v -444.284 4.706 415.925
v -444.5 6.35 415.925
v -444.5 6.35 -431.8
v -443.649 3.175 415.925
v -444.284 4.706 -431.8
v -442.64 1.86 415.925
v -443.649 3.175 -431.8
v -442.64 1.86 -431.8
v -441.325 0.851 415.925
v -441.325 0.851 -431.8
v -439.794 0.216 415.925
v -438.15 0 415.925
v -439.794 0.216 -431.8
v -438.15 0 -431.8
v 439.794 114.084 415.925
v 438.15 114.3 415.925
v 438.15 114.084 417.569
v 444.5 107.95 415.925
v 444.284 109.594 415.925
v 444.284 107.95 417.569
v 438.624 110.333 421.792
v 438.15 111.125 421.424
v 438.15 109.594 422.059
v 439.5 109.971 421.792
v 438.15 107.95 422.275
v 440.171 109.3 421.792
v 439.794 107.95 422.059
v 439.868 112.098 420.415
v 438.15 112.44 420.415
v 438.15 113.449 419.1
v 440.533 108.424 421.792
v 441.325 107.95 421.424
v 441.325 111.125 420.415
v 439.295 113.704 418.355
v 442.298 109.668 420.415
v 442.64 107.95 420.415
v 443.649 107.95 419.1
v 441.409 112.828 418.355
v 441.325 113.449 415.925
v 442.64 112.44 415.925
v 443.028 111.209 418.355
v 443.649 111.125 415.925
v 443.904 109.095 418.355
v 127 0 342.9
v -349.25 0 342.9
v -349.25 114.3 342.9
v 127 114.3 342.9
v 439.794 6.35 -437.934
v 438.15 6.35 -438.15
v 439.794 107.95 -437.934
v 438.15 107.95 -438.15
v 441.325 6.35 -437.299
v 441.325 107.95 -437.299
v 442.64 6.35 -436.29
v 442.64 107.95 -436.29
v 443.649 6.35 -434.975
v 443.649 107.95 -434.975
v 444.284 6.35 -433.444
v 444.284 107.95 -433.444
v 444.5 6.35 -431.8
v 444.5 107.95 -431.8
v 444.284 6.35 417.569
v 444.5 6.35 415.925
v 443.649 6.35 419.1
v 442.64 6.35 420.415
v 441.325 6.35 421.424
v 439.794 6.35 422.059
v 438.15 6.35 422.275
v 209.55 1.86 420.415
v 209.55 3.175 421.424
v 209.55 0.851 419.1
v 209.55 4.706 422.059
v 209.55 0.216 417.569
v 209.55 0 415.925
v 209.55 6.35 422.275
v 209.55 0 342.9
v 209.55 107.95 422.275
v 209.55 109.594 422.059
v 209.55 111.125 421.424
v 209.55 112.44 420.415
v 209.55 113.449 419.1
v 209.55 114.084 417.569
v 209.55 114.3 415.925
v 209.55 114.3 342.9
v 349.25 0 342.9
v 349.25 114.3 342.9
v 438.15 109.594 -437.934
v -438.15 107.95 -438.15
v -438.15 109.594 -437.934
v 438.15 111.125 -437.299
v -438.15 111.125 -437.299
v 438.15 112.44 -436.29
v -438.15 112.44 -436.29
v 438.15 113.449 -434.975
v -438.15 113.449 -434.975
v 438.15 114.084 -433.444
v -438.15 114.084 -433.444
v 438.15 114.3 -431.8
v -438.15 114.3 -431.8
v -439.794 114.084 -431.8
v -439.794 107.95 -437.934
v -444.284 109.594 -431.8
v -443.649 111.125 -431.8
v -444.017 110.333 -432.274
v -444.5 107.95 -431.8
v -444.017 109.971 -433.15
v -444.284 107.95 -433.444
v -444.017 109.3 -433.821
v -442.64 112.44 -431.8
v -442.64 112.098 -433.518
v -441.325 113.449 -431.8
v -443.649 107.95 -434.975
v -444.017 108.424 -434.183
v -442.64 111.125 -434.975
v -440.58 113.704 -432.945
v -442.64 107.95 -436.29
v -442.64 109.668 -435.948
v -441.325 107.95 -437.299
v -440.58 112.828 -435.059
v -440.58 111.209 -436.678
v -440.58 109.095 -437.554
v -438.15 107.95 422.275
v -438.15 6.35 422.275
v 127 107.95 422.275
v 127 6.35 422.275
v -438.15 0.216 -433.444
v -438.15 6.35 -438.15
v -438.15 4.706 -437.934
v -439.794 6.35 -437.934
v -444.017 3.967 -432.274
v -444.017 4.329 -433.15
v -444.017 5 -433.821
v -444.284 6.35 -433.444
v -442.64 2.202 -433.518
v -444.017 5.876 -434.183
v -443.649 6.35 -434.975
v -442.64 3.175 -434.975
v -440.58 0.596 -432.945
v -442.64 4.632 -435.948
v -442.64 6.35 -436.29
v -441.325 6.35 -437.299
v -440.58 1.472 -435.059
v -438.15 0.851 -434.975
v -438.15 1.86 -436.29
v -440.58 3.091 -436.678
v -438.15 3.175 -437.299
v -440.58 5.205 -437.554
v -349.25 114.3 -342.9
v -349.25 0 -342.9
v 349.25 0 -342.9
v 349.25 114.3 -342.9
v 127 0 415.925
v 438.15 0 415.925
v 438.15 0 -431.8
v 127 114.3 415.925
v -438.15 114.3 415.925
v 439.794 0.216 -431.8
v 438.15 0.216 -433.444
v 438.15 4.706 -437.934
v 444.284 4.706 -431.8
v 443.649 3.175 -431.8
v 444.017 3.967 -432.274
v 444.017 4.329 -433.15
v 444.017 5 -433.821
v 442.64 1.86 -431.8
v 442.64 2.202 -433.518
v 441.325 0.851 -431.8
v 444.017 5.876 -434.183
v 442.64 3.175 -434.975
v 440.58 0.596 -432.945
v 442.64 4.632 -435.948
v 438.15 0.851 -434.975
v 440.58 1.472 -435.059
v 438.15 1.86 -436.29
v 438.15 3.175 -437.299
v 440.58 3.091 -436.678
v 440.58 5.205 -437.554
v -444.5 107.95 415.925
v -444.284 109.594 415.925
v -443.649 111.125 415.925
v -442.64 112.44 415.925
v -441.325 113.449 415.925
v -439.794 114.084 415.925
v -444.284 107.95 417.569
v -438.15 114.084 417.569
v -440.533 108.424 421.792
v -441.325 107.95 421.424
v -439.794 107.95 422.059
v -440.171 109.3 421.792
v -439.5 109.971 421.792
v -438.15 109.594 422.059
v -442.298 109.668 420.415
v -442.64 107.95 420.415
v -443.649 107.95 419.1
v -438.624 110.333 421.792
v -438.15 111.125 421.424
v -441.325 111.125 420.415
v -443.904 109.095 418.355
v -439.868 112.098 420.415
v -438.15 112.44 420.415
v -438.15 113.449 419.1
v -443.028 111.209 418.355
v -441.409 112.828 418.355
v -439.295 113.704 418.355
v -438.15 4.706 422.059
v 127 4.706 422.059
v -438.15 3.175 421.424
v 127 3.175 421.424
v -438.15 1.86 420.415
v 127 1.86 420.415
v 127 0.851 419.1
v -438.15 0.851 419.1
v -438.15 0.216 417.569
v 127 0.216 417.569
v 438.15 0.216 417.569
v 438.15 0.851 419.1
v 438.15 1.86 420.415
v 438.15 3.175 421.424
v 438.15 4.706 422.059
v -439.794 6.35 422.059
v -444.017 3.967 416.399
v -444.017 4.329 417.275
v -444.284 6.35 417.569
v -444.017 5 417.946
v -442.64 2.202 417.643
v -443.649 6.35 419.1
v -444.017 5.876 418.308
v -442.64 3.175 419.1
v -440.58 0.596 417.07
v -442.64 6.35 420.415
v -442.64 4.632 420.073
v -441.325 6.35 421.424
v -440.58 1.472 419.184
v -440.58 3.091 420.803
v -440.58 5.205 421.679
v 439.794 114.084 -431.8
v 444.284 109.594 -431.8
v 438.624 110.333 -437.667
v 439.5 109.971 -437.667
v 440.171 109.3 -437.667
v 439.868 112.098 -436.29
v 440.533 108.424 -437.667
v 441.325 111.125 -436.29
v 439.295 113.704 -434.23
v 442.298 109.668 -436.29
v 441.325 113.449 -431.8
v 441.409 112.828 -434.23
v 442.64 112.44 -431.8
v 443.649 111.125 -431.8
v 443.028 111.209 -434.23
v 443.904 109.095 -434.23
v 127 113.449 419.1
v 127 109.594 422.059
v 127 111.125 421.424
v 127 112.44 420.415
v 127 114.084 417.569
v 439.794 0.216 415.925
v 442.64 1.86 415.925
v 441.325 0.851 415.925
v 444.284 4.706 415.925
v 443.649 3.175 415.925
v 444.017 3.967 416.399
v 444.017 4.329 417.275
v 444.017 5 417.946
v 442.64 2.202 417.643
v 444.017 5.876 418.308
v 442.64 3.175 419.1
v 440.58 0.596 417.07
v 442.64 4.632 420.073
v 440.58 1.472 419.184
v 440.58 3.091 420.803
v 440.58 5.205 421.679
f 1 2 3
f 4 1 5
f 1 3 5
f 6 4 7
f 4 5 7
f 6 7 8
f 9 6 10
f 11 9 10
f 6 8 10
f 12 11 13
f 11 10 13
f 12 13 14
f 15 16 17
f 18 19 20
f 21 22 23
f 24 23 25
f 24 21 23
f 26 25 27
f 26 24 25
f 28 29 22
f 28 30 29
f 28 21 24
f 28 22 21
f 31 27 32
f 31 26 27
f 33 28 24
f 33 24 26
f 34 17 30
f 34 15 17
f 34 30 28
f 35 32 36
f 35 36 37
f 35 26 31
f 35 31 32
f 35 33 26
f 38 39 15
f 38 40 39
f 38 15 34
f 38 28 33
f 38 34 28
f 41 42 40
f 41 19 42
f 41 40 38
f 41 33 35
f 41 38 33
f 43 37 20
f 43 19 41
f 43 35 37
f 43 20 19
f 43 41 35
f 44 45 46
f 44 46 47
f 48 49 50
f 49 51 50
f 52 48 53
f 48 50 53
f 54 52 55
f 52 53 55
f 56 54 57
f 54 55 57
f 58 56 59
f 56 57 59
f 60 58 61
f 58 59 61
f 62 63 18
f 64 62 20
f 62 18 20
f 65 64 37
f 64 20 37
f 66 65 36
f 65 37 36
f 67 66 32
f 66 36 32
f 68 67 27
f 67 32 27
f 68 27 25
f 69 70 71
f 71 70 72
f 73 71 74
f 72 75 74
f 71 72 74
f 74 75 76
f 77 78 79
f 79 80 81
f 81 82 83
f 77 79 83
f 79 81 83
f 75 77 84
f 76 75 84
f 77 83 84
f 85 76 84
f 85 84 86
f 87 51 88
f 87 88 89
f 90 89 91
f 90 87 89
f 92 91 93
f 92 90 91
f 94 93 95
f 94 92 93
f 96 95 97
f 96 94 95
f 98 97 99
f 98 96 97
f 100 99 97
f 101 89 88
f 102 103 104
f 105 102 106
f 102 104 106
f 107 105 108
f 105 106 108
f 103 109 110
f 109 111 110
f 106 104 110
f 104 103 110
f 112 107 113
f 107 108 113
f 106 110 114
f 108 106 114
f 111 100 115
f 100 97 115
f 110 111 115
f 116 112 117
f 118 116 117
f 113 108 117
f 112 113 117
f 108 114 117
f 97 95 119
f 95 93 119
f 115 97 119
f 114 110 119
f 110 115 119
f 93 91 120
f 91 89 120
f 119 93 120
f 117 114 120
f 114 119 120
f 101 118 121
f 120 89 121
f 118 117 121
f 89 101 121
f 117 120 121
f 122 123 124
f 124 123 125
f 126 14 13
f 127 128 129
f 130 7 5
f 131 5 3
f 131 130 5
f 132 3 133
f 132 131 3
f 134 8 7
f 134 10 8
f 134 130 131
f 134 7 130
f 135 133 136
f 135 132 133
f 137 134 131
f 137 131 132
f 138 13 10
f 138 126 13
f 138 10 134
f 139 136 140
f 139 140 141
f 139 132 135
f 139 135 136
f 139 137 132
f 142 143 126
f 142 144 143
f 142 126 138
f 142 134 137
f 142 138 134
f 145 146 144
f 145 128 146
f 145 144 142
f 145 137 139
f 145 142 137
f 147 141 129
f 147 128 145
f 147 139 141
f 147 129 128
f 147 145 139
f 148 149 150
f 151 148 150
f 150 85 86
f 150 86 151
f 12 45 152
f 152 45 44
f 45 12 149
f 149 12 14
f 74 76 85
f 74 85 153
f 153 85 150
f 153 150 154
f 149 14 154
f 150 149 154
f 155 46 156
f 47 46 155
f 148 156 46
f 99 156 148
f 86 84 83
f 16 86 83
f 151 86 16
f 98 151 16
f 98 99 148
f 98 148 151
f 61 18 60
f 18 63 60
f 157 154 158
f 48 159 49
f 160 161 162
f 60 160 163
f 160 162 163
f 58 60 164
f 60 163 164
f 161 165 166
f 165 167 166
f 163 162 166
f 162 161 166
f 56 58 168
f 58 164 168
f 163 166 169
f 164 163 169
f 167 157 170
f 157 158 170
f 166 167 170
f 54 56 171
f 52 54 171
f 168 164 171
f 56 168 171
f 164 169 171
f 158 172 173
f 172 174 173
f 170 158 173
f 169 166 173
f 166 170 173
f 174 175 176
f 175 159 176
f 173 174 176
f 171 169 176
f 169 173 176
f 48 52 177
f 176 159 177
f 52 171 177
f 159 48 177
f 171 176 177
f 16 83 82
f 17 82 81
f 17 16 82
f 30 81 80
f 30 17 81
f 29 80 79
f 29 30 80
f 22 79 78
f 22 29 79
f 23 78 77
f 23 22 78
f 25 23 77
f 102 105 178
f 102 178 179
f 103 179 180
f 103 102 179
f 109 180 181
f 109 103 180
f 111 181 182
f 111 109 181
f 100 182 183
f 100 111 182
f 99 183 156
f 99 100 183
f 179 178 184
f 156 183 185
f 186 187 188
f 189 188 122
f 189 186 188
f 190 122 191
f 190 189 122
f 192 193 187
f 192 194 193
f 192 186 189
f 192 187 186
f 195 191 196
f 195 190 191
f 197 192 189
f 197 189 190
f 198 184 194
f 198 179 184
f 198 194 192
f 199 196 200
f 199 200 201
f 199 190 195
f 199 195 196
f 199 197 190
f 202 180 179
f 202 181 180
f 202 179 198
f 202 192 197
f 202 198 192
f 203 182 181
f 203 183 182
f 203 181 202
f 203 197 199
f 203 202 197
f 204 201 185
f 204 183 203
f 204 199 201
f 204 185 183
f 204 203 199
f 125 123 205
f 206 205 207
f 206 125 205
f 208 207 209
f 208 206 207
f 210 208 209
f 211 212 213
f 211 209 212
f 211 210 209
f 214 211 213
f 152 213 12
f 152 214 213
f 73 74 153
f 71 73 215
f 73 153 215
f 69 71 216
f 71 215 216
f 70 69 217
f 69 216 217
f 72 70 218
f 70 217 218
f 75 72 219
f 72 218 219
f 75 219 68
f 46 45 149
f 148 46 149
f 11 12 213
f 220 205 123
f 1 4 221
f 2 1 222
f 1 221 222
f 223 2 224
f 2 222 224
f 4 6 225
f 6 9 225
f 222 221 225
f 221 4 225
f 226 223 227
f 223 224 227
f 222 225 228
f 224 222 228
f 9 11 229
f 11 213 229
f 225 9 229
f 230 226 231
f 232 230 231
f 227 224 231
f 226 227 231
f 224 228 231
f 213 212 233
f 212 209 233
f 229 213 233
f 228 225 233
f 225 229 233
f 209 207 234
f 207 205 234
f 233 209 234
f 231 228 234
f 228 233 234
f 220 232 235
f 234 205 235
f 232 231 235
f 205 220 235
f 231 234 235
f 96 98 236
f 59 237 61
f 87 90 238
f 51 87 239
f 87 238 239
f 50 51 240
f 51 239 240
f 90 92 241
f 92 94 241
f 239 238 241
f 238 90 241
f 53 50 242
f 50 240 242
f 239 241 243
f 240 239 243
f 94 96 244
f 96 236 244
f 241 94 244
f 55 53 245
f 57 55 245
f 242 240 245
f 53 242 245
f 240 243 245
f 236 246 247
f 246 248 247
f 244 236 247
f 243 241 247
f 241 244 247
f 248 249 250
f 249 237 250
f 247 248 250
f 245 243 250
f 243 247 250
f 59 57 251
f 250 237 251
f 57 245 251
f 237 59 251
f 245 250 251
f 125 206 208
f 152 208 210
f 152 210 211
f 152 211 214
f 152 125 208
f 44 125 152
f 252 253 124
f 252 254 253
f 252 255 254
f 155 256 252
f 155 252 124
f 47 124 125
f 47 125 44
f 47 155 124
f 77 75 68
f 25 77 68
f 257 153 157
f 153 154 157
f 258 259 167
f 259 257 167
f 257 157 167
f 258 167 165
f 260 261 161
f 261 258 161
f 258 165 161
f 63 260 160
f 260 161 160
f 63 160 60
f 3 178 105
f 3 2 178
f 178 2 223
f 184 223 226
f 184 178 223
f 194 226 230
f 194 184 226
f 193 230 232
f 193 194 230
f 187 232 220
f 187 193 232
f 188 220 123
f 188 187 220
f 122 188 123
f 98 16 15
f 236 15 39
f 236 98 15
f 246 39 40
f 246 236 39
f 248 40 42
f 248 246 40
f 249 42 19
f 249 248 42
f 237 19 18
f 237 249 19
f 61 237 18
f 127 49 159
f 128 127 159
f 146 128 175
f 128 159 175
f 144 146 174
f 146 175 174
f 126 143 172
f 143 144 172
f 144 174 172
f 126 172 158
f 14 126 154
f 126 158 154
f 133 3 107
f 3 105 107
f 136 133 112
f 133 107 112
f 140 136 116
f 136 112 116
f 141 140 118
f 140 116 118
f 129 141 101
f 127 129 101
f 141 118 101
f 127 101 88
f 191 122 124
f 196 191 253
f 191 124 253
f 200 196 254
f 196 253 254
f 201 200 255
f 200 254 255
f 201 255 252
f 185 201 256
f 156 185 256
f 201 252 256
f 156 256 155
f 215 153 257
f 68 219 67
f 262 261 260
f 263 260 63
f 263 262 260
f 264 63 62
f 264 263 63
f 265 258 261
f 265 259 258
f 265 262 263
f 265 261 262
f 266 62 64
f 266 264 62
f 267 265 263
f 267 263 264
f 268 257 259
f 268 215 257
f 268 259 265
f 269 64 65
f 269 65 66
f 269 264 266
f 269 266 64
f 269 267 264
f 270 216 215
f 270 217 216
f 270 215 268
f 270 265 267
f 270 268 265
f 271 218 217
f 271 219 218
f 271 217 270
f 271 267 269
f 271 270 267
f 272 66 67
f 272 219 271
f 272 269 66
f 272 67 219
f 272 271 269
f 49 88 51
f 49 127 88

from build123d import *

# Parameters (mm, degrees)
SKETCH2_W           = 889
SKETCH2_H           = 860.425
SKETCH2_W_2         = 698.5
SKETCH2_H_2         = 685.8
BOSS_EXTRUDE1_DEPTH = 114.3
SKETCH3_W           = 82.55
SKETCH3_H           = 79.375
CUT_EXTRUDE1_DEPTH  = 115.3
FILLET1_R           = 6.35


with BuildPart() as part:
    # Sketch2 → Boss-Extrude1 (new body)
    with BuildSketch(Plane(origin=(0, 0, 0), x_dir=(1, 0, 0), z_dir=(0, 1, 0))):
        with Locations((0, 7.9375)):
            Rectangle(SKETCH2_W, SKETCH2_H)
        Rectangle(SKETCH2_W_2, SKETCH2_H_2, mode=Mode.SUBTRACT)
    extrude(amount=BOSS_EXTRUDE1_DEPTH)

    # Sketch3 → Cut-Extrude1 (cut, through all)
    with BuildSketch(Plane(origin=(0, 114.3, 0), x_dir=(1, 0, 0), z_dir=(0, 1, 0))):
        with Locations((168.275, -382.5875)):
            Rectangle(SKETCH3_W, SKETCH3_H)
    extrude(amount=-CUT_EXTRUDE1_DEPTH, mode=Mode.SUBTRACT)

    # Fillet1
    fillet1_edges = [part.edges().sort_by_distance(p)[0] for p in [
        (444.5, 114.3, -7.9375),
        (0, 114.3, -438.15),
        (327.025, 0, 422.275),
        (327.025, 114.3, 422.275),
        (-444.5, 114.3, -7.9375),
        (0, 0, -438.15),
        (444.5, 0, -7.9375),
        (-158.75, 0, 422.275),
        (-444.5, 0, -7.9375),
        (-444.5, 57.15, -438.15),
        (444.5, 57.15, -438.15),
        (444.5, 57.15, 422.275),
        (-444.5, 57.15, 422.275),
        (-158.75, 114.3, 422.275),
    ]]
    fillet(fillet1_edges, radius=FILLET1_R)


solid = part.part
